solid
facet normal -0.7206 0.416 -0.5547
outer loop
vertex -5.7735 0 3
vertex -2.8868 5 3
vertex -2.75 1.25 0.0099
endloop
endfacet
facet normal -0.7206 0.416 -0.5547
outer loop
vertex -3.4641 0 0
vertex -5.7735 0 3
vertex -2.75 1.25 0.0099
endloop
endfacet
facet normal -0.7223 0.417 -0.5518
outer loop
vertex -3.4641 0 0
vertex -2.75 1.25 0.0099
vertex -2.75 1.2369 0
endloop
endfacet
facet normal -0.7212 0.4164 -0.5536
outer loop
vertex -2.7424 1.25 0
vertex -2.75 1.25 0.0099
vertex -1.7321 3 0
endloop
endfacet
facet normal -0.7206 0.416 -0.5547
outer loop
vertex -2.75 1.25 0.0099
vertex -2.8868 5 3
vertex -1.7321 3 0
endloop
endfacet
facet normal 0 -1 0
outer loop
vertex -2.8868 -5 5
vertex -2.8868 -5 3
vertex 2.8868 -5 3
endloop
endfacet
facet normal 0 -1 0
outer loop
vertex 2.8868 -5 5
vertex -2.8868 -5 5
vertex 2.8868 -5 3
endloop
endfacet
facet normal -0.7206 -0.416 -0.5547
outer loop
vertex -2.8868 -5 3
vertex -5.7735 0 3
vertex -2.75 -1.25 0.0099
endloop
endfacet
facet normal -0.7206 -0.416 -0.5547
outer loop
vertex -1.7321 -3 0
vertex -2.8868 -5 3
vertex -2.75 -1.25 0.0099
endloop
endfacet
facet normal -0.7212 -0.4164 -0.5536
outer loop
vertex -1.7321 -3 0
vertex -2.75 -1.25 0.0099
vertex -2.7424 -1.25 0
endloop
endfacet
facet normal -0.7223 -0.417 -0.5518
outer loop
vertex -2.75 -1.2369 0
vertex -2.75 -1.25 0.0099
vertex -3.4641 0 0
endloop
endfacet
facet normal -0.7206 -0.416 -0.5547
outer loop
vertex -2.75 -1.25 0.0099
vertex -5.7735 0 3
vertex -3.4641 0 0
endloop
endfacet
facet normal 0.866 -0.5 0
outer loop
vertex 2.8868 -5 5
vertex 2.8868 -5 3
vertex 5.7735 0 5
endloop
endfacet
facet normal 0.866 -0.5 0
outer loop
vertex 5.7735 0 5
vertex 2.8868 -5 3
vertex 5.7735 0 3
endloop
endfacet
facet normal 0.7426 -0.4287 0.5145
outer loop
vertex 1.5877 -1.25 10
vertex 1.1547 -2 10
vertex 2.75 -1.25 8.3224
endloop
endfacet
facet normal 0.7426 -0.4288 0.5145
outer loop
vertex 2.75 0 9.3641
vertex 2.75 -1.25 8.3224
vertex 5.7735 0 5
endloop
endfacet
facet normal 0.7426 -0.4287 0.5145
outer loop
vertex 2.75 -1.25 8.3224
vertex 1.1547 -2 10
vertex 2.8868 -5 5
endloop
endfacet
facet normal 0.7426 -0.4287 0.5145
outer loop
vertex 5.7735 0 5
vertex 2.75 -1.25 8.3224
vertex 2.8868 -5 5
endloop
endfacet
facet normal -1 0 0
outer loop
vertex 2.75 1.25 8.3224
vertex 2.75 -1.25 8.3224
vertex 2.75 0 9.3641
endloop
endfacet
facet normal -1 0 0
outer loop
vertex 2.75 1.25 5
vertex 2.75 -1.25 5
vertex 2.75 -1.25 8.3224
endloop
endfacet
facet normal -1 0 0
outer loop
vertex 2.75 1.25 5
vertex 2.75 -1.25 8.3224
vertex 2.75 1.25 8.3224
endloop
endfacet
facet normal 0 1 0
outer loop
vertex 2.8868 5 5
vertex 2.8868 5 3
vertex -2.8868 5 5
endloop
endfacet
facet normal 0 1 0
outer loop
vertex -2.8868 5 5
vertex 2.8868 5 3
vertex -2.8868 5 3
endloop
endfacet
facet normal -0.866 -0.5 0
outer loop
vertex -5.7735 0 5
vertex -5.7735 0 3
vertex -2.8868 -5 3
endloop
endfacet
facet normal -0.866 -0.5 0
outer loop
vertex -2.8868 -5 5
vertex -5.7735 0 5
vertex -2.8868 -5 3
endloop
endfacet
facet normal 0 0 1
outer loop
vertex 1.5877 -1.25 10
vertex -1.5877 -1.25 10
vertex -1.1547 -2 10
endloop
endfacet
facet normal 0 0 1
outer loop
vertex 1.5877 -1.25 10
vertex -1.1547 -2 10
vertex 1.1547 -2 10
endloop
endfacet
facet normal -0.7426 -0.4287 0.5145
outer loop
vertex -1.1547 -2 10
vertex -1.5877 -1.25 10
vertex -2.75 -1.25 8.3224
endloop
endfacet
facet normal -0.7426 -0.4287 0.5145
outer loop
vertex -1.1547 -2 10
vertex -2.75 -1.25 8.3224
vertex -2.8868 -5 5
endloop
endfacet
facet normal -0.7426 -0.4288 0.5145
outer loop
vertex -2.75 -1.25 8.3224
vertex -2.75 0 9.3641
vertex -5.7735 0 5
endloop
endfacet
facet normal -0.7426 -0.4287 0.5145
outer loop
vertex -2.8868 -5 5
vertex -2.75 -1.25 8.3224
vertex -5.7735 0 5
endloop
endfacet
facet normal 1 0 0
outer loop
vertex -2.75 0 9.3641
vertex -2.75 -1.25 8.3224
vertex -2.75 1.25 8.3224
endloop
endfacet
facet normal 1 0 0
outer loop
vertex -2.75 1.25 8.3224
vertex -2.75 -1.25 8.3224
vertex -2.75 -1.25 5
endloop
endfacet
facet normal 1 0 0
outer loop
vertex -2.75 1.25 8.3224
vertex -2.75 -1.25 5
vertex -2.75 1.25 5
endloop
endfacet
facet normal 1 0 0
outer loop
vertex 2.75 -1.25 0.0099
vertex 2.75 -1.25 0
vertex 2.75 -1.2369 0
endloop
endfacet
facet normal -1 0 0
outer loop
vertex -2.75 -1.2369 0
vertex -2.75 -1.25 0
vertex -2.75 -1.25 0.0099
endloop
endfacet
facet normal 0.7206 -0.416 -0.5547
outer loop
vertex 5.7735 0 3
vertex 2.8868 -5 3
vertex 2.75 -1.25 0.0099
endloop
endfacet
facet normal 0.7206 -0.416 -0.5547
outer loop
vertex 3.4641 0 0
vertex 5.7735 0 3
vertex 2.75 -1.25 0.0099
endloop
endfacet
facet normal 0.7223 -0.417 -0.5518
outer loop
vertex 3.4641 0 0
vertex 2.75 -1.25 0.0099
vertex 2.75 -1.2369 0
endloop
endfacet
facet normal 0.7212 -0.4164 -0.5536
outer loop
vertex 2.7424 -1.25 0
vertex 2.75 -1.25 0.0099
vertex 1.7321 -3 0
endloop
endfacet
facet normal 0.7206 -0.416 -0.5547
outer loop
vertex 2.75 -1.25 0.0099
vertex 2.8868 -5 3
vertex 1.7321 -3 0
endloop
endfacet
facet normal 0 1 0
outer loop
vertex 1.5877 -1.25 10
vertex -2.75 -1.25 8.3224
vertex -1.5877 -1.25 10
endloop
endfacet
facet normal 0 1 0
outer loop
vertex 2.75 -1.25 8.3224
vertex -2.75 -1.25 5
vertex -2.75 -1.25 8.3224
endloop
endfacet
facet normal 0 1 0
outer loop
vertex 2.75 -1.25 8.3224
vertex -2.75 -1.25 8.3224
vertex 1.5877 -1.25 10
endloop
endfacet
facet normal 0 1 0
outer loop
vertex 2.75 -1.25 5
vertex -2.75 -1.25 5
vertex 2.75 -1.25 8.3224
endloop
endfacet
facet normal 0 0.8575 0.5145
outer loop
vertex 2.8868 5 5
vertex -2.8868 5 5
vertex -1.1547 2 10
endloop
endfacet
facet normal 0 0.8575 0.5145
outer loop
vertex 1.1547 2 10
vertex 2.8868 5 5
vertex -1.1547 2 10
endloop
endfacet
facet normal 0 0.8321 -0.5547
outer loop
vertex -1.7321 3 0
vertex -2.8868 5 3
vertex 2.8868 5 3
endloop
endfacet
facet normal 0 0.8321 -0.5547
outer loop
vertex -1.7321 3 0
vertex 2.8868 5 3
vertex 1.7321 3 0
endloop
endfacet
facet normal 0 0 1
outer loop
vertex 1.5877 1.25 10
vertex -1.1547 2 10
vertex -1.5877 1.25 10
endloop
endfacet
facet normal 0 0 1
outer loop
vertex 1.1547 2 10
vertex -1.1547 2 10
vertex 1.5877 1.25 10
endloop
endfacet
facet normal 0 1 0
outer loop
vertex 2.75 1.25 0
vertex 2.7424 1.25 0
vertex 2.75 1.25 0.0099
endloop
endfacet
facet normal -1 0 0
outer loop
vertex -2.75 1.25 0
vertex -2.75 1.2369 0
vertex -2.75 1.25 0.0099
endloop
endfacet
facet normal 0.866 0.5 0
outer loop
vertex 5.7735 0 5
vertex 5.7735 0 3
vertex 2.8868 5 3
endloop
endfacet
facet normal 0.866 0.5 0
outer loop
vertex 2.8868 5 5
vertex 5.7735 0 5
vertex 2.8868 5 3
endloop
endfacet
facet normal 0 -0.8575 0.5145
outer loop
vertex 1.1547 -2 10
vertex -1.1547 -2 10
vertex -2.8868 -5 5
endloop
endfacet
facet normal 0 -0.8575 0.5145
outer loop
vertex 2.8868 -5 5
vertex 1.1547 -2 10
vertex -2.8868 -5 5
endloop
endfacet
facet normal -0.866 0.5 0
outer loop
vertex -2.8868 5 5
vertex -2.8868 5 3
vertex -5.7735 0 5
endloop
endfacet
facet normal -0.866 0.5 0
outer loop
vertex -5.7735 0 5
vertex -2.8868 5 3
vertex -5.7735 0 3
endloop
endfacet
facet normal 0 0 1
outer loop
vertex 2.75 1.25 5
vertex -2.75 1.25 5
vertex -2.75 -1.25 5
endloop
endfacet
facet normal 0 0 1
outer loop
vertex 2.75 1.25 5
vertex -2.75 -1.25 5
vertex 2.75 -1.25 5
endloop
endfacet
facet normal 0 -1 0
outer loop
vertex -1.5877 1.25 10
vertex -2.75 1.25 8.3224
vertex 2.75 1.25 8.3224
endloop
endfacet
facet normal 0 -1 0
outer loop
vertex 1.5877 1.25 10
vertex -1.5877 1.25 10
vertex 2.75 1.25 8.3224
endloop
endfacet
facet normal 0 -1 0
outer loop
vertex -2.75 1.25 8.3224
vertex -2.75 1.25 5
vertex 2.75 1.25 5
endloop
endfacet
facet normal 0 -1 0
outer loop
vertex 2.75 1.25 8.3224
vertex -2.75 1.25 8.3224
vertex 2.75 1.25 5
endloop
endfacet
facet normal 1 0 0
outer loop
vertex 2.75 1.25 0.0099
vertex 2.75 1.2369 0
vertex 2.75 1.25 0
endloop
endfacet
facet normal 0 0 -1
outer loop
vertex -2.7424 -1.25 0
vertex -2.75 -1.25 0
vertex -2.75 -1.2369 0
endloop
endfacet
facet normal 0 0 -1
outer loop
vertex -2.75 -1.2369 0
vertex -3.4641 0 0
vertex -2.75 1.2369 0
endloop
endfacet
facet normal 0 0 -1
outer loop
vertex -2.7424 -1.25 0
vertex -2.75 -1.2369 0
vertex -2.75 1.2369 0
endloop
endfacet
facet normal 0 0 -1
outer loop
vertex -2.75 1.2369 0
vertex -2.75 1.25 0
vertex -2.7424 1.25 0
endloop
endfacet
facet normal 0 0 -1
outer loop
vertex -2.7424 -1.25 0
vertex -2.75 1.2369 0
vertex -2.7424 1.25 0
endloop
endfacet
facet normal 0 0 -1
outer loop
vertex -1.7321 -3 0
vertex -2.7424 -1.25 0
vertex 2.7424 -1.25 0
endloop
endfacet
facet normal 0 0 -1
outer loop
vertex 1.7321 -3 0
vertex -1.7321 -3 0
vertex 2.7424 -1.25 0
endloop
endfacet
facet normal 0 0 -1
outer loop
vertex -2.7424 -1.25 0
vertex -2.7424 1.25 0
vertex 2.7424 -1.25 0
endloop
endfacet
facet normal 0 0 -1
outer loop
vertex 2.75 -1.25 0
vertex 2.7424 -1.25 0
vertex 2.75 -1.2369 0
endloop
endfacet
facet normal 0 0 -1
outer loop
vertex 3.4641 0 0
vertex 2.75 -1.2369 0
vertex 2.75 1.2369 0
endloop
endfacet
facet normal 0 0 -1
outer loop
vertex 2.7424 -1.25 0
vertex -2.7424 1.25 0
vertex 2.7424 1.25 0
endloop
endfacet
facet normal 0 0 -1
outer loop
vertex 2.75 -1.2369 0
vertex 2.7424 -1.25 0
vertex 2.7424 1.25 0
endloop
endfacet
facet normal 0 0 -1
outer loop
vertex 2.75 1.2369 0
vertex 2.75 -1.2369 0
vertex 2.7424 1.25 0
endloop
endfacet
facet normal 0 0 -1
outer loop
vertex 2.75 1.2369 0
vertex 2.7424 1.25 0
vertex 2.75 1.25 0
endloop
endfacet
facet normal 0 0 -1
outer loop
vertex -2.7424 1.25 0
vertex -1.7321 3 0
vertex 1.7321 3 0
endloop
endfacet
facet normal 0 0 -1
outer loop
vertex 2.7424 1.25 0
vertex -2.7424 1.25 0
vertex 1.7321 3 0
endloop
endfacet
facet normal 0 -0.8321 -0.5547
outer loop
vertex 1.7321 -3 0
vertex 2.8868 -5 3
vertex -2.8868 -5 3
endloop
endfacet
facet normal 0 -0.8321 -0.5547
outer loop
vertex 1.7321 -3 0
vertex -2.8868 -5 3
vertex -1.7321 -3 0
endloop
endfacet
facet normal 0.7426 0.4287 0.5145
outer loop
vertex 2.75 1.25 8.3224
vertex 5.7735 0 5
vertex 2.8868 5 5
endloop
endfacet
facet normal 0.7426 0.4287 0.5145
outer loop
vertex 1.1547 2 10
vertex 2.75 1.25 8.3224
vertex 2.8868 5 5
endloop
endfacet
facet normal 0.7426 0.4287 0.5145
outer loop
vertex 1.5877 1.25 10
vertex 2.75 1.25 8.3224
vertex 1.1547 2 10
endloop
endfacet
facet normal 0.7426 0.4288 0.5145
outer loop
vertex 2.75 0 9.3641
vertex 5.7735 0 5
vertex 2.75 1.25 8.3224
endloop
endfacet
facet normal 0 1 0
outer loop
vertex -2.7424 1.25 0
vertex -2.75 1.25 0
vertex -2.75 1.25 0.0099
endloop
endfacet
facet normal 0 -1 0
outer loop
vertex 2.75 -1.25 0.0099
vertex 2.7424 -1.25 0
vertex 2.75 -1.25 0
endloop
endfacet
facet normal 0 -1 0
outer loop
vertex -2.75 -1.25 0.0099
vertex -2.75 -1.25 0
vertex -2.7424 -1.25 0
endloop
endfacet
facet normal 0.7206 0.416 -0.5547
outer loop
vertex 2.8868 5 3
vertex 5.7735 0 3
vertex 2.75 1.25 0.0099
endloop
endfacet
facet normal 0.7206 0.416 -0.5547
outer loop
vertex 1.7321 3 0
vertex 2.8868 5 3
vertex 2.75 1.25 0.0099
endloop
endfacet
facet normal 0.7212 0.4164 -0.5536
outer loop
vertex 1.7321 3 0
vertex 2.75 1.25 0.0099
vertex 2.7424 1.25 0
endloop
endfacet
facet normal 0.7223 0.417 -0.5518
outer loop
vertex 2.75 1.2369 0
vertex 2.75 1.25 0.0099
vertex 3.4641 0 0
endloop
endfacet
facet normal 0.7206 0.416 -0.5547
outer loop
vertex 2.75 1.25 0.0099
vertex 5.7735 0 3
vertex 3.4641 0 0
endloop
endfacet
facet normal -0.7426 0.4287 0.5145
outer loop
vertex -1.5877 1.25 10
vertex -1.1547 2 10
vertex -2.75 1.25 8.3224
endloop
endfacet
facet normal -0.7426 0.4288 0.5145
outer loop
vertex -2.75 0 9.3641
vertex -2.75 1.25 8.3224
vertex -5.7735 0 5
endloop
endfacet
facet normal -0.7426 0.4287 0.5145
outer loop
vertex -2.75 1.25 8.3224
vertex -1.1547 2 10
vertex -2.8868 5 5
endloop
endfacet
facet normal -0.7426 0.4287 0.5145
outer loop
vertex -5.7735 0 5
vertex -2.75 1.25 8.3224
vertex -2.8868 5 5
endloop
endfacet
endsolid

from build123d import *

# Parameters (mm, degrees)
F0_W        = 5.5
F0_H        = 2.5
F1_DEPTH    = 10
F2_T1_DEPTH = 21.2763058351
F2_T3_DEPTH = 21.2763058351
F2_T5_DEPTH = 21.2763058351
F2_T7_DEPTH = 21.2763058351
F2_T9_DEPTH = 21.2763058351
F3_T1_DEPTH = 31.6361136638
F3_T3_DEPTH = 31.6361136638
F3_T5_DEPTH = 31.6361136638
F3_T7_DEPTH = 31.6361136638
F3_T9_DEPTH = 31.6361136638
F4_DEPTH    = 5


# Not quite as in the source:
# - a fillet or chamfer that OpenCascade refuses, or shapes differently, is made with other operations: its cross-section is extruded or revolved along the edge and cut away or added


with BuildPart() as f1:
    # F0 (on Top) → F1 (new body)
    with BuildSketch(Plane.XY):
        Polygon((2.8867513459, 5), (-2.8867513459, 5), (-5.7735026919, 0), (-2.8867513459, -5), (2.8867513459, -5), (5.7735026919, 0), align=None)
        Rectangle(F0_W, F0_H, mode=Mode.SUBTRACT)
    extrude(amount=F1_DEPTH)

    # F2: chamfer of 2 x 3 on 6 edges, made by hand

    # F2_s2 → F2_t1 (cut)
    with BuildSketch(Plane.YZ.offset(-10.6381529176)):
        Polygon((5, 3), (3, 0), (5, 0), align=None)
        Polygon((-5, 3), (-3, 0), (-5, 0), align=None)
    extrude(amount=F2_T1_DEPTH, mode=Mode.SUBTRACT)

    # F2_s4 → F2_t3 (cut)
    with BuildSketch(Plane(origin=(5.3190764588, -9.212910676, 0), x_dir=(0, 0, 1), z_dir=(-0.5, 0.8660254038, 0))):
        Polygon((3, 5), (0, 3), (0, 5), align=None)
    extrude(amount=F2_T3_DEPTH, mode=Mode.SUBTRACT)

    # F2_s6 → F2_t5 (cut)
    with BuildSketch(Plane(origin=(5.3190764588, 9.212910676, 0), x_dir=(0, 0, 1), z_dir=(-0.5, -0.8660254038, 0))):
        Polygon((3, 5), (0, 3), (0, 5), align=None)
    extrude(amount=F2_T5_DEPTH, mode=Mode.SUBTRACT)

    # F2_s8 → F2_t7 (cut)
    with BuildSketch(Plane(origin=(-5.3190764588, 9.212910676, 0), x_dir=(0, 0, 1), z_dir=(0.5, -0.8660254038, 0))):
        Polygon((3, 5), (0, 3), (0, 5), align=None)
    extrude(amount=F2_T7_DEPTH, mode=Mode.SUBTRACT)

    # F2_s10 → F2_t9 (cut)
    with BuildSketch(Plane(origin=(-5.3190764588, -9.212910676, 0), x_dir=(0, 0, 1), z_dir=(0.5, 0.8660254038, 0))):
        Polygon((3, 5), (0, 3), (0, 5), align=None)
    extrude(amount=F2_T9_DEPTH, mode=Mode.SUBTRACT)

    # F3: chamfer of 5 x 3 on 6 edges, made by hand

    # F3_s2 → F3_t1 (cut)
    with BuildSketch(Plane(origin=(7.909028416, -13.6988390549, 0), x_dir=(0, 0, 1), z_dir=(-0.5, 0.8660254038, 0))):
        Polygon((5, 5), (10, 2), (10, 5), align=None)
    extrude(amount=F3_T1_DEPTH, mode=Mode.SUBTRACT)

    # F3_s4 → F3_t3 (cut)
    with BuildSketch(Plane.YZ.offset(-15.8180568319)):
        Polygon((5, 5), (2, 10), (5, 10), align=None)
        Polygon((-2, 10), (-5, 5), (-5, 10), align=None)
    extrude(amount=F3_T3_DEPTH, mode=Mode.SUBTRACT)

    # F3_s6 → F3_t5 (cut)
    with BuildSketch(Plane(origin=(7.909028416, 13.6988390549, 0), x_dir=(0, 0, 1), z_dir=(-0.5, -0.8660254038, 0))):
        Polygon((10, 2), (5, 5), (10, 5), align=None)
    extrude(amount=F3_T5_DEPTH, mode=Mode.SUBTRACT)

    # F3_s8 → F3_t7 (cut)
    with BuildSketch(Plane(origin=(-7.909028416, 13.6988390549, 0), x_dir=(0, 0, 1), z_dir=(0.5, -0.8660254038, 0))):
        Polygon((10, 2), (5, 5), (10, 5), align=None)
    extrude(amount=F3_T7_DEPTH, mode=Mode.SUBTRACT)

    # F3_s10 → F3_t9 (cut)
    with BuildSketch(Plane(origin=(-7.909028416, -13.6988390549, 0), x_dir=(0, 0, 1), z_dir=(0.5, 0.8660254038, 0))):
        Polygon((10, 2), (5, 5), (10, 5), align=None)
    extrude(amount=F3_T9_DEPTH, mode=Mode.SUBTRACT)

    # F0 (on Top) → F4 (join)
    with BuildSketch(Plane.XY):
        Rectangle(F0_W, F0_H)
    extrude(amount=F4_DEPTH)


solid = f1.part
